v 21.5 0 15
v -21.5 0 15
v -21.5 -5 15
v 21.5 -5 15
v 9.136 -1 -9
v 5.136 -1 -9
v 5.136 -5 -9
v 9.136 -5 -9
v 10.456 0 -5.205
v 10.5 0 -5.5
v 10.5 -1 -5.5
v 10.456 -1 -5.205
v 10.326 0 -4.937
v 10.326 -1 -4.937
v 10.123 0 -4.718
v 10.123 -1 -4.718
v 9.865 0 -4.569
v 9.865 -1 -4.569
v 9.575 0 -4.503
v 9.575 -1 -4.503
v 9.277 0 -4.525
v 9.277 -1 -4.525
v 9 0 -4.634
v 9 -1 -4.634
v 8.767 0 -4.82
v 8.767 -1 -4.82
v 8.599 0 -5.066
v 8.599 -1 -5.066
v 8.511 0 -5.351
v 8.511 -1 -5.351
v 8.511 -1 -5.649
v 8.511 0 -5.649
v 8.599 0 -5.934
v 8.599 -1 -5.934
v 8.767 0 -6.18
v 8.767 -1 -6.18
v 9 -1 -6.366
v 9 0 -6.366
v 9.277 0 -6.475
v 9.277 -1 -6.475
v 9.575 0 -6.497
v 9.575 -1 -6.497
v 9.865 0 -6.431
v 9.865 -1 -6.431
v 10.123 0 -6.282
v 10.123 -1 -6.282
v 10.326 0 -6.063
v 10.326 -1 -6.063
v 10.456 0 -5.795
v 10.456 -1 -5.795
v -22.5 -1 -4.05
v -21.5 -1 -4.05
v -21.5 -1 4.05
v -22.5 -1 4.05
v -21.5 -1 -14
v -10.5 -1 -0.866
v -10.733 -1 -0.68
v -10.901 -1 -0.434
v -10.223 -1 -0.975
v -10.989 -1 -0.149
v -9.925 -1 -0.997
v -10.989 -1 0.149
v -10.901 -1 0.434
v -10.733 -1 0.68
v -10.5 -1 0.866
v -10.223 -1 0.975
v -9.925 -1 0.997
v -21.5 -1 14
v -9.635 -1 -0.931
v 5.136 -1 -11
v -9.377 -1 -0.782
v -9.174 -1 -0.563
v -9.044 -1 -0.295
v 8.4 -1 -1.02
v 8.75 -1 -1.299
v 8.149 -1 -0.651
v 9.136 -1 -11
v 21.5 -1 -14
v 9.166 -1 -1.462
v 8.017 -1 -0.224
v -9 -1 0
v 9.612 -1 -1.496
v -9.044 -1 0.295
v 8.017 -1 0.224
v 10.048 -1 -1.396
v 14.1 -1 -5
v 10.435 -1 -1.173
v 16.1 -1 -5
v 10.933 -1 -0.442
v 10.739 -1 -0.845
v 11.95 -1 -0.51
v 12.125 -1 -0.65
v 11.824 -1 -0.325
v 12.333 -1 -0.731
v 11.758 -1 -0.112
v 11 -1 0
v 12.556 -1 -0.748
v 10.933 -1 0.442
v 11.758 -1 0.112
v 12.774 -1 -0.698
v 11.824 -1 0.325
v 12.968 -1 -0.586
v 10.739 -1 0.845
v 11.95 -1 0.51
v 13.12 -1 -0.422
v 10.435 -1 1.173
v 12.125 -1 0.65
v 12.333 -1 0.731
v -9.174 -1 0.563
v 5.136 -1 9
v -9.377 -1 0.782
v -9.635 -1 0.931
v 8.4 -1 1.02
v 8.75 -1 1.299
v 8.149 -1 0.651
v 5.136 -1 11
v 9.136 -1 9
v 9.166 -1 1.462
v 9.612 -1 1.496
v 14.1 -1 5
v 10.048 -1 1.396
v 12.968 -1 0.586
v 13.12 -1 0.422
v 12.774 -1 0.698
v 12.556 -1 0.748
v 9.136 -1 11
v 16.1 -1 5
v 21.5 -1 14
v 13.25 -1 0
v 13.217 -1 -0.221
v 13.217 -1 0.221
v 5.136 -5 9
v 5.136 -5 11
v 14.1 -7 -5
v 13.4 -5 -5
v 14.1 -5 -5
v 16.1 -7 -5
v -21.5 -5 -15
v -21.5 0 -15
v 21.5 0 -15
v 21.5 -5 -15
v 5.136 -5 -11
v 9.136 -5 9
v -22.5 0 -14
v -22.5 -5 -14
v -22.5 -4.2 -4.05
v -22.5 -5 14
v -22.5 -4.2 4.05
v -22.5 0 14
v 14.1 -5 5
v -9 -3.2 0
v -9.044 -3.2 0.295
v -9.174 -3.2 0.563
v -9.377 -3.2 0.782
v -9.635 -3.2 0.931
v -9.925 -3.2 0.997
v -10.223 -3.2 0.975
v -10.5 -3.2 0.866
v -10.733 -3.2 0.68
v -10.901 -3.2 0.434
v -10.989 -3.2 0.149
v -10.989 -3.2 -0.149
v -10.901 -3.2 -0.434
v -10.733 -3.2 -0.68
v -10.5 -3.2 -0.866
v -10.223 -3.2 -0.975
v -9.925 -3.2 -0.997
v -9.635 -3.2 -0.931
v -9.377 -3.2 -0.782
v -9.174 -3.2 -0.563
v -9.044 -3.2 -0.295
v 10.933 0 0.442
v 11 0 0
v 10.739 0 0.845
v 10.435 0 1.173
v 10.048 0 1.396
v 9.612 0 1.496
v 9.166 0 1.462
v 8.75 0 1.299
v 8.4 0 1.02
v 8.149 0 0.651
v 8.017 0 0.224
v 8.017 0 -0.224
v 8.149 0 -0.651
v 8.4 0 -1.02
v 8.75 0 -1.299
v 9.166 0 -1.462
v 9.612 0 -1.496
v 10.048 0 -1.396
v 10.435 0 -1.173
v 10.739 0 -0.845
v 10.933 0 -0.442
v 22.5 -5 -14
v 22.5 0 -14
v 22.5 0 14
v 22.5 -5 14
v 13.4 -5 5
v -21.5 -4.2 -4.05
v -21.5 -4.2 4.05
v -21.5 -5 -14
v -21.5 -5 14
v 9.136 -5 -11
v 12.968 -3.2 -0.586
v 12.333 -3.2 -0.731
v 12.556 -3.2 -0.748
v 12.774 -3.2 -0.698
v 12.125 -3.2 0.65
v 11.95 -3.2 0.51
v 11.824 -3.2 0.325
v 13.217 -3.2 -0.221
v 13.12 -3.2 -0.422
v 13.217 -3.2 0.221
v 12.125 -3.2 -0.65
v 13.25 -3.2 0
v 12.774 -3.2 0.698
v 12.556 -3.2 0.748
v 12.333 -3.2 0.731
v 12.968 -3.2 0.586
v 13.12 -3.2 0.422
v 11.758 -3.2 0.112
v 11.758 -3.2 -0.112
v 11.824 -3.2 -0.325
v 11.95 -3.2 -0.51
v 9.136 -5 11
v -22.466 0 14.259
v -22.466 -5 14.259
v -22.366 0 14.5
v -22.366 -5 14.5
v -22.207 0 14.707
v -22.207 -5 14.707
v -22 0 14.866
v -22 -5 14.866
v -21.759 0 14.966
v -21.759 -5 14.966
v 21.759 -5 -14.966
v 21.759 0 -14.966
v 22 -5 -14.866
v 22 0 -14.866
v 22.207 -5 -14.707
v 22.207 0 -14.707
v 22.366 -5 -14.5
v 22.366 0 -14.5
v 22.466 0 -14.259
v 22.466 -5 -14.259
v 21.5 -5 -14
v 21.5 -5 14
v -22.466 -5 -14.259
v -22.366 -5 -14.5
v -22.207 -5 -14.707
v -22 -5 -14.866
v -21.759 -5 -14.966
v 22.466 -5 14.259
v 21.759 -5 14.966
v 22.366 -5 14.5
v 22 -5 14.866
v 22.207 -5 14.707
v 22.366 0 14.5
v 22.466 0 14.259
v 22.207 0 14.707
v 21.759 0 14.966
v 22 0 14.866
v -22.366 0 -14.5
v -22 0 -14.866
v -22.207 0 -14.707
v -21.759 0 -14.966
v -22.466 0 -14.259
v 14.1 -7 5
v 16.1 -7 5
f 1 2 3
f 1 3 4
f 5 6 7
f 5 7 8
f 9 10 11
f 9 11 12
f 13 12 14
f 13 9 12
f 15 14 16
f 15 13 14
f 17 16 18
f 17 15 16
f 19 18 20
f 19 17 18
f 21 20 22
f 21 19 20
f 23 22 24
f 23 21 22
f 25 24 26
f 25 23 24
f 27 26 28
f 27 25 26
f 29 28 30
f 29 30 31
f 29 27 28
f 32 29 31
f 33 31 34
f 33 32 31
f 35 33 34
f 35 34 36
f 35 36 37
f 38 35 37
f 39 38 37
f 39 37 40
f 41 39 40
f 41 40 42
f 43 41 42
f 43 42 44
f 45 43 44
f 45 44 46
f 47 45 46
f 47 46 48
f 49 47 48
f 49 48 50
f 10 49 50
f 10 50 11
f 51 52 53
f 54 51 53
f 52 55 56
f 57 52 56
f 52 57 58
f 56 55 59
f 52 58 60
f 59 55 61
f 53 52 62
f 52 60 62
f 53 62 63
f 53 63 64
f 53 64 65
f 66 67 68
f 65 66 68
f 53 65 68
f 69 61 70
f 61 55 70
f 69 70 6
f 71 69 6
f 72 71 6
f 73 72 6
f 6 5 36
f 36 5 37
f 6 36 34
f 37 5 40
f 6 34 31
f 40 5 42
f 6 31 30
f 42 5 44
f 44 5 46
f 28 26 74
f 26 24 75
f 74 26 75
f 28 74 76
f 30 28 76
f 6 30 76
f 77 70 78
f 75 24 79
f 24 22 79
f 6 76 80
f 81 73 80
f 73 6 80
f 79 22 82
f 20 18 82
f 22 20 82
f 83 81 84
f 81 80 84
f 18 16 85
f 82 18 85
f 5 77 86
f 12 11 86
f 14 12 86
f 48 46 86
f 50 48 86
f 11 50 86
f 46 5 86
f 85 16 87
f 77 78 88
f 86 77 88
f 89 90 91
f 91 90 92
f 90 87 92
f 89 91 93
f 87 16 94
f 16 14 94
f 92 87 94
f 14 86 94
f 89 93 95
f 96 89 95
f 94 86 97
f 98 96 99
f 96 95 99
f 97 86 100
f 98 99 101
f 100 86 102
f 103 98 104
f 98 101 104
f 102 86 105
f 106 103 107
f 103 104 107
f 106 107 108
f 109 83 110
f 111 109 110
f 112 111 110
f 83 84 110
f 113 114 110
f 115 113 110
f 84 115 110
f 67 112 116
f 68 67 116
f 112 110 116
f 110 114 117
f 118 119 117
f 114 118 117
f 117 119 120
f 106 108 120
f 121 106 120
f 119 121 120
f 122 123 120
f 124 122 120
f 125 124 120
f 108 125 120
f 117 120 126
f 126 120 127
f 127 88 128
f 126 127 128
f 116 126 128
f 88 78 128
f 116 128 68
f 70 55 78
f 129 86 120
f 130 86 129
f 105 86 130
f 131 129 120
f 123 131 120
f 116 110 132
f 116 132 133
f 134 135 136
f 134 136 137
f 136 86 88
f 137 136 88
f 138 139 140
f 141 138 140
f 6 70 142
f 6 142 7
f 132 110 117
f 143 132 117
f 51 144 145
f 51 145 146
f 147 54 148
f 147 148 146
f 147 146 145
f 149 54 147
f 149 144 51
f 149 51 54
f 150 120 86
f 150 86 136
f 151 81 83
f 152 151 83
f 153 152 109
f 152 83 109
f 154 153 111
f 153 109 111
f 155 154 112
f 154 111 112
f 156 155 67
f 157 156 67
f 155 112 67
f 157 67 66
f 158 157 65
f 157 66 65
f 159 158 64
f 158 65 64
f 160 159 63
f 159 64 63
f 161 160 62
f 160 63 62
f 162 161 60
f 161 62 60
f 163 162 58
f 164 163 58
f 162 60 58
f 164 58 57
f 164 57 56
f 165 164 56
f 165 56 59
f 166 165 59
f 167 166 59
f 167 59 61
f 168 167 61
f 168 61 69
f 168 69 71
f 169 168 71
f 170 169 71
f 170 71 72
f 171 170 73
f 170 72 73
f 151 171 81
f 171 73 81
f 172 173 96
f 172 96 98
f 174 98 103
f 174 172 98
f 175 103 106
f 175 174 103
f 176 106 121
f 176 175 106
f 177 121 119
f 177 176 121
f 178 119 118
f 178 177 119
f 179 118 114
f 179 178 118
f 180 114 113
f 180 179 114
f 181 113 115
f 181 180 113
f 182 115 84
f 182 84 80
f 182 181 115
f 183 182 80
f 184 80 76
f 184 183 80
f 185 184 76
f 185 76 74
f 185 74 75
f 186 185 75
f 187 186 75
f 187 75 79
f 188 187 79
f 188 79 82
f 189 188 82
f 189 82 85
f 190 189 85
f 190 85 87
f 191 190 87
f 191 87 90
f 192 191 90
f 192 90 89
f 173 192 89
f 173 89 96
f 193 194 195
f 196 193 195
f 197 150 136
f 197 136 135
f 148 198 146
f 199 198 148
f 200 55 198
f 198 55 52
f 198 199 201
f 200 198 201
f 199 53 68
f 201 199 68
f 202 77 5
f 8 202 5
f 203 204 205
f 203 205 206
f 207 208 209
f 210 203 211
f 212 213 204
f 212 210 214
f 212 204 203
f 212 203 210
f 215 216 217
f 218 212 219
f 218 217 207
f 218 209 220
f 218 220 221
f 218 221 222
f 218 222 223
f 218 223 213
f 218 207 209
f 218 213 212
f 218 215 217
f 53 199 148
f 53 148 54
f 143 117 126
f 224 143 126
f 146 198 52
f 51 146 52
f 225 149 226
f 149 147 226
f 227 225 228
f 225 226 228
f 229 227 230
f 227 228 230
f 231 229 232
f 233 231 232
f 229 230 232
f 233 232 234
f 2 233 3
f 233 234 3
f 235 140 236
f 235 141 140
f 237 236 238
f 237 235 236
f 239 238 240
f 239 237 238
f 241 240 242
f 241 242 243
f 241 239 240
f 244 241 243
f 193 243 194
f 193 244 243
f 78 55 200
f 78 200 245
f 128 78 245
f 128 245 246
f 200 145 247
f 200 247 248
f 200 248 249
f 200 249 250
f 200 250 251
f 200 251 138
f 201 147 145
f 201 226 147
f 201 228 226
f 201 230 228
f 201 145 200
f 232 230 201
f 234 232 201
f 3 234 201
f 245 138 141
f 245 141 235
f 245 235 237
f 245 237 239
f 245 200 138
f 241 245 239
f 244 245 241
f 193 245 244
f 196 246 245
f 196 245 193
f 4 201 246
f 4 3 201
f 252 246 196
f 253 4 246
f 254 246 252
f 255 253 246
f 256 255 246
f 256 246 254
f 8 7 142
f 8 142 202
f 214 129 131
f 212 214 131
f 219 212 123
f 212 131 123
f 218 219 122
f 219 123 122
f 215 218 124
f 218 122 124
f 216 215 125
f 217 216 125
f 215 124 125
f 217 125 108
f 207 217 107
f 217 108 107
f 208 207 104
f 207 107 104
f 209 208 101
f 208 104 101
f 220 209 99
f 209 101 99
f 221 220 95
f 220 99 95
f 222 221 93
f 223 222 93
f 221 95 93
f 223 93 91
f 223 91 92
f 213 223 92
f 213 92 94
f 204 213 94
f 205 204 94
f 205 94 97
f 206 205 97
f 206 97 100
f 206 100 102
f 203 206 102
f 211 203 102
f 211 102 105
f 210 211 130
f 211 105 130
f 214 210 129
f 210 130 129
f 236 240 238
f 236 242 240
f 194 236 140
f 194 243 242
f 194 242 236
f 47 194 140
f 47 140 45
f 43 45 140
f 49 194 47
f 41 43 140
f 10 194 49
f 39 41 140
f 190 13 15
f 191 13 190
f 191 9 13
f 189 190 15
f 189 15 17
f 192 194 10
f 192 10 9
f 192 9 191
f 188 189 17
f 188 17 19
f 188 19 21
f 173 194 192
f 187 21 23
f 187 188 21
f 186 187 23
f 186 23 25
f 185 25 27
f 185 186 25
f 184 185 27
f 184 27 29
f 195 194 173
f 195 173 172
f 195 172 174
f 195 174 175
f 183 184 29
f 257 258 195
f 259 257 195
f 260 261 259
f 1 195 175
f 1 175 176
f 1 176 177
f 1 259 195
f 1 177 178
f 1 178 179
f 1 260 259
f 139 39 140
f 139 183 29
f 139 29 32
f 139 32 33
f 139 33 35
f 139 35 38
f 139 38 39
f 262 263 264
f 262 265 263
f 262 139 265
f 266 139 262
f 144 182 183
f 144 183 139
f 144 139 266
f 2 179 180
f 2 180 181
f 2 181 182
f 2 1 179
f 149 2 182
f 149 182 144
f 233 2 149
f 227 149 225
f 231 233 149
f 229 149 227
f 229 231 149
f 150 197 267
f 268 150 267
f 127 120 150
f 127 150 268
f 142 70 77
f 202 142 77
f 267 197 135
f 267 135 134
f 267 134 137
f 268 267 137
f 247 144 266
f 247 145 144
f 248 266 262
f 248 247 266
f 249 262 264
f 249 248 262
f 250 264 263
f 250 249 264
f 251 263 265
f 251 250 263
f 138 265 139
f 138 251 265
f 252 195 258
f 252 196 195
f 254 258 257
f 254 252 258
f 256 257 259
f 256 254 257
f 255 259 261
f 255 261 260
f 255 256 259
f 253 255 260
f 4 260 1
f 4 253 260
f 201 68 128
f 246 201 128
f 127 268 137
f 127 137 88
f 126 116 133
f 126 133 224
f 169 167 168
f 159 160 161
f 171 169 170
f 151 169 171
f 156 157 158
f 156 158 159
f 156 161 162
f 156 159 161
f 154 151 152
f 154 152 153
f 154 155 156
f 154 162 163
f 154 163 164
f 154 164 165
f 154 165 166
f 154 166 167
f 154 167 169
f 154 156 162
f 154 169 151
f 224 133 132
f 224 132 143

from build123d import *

# Parameters (mm, degrees)
F0_W      = 45
F0_H      = 30
F0_R      = 1
F0_R_2    = 1.5
F1_DEPTH  = 5
F2_R      = 1
F3_T      = 1
F4_W      = 3.2
F4_H      = 8.1
F5_DEPTH  = 25
F6_R      = 1
F7_DEPTH  = 2.2
F10_DEPTH = 5
F11_R     = 0.75
F12_DEPTH = 2.2
F13_W     = 4
F13_H     = 2
F14_DEPTH = 4


# Not quite as in the source:
# - a shell that OpenCascade refuses in one call is made with other operations: the cavity is built on its own and cut out


with BuildPart() as f1:
    # F0 (on Front) → F1 (new body)
    with BuildSketch(Plane.XZ):
        Rectangle(F0_W, F0_H)
        with Locations((9.5, -5.5)):
            Circle(F0_R, mode=Mode.SUBTRACT)
        with Locations((-10, 0)):
            Circle(F0_R, mode=Mode.SUBTRACT)
        with Locations((9.5, 0)):
            Circle(F0_R_2, mode=Mode.SUBTRACT)
        with Locations((-10, 0)):
            Circle(F0_R)
    extrude(amount=F1_DEPTH)

    # F2
    f2_edges = [f1.edges().sort_by_distance(p)[0] for p in [
        (-22.5, -2.5, -15),
        (22.5, -2.5, -15),
        (22.5, -2.5, 15),
        (-22.5, -2.5, 15),
    ]]
    fillet(f2_edges, radius=F2_R)

    # F3: shell of thickness 1, made by hand


with BuildPart() as f3_core1:
    # F3_t2: copy of F1
    add(f1.part)

    # the walls: a layer under each face that stays
    f3_faces = [f3_core1.faces().sort_by_distance(p)[0] for p in [
        (0, -2.5, -15),
        (0, 0, 0),
        (-22.5, -2.5, 0),
        (22.5, -2.5, 0),
        (0, -2.5, 15),
    ]]
    thicken(f3_faces, amount=-F3_T, mode=Mode.SUBTRACT)


with BuildPart() as f1_1:
    add(f1.part)

    # what is left inside the walls is the cavity
    f3_cavity = [f3_core1.part.solids().sort_by_distance(p)[0] for p in [
        (0, -1.01, -4.666667),
    ]]
    add(f3_cavity, mode=Mode.SUBTRACT)

    # F4 (on face) → F5 (cut)
    with BuildSketch(Plane.YZ.offset(-21.5)):
        with Locations((-2.6, 0)):
            Rectangle(F4_W, F4_H)
    extrude(amount=-F5_DEPTH, mode=Mode.SUBTRACT)

    # F6 (on face) → F7 (join)
    with BuildSketch(Plane.XZ.offset(1)):
        with Locations((-10, 0)):
            Circle(F6_R)
    extrude(amount=F7_DEPTH)

    # F9 (on Top) → F10 (join, symmetric)
    with BuildSketch(Plane.XY):
        Polygon((16.1, 0), (14.1, 0), (14.1, -5), (13.4, -5), (14.1, -7), (16.1, -7), align=None)
    extrude(amount=F10_DEPTH, both=True)

    # F11 (on face) → F12 (join, through all)
    with BuildSketch(Plane.XZ.offset(1)):
        with Locations((12.5, 0)):
            Circle(F11_R)
    extrude(amount=F12_DEPTH)

    # F13 (on face) → F14 (join, through all)
    with BuildSketch(Plane.XZ.offset(1)):
        with Locations((7.1361453363, 10)):
            Rectangle(F13_W, F13_H)
        with Locations((7.1361453363, -10)):
            Rectangle(F13_W, F13_H)
    extrude(amount=F14_DEPTH)


solid = f1_1.part
